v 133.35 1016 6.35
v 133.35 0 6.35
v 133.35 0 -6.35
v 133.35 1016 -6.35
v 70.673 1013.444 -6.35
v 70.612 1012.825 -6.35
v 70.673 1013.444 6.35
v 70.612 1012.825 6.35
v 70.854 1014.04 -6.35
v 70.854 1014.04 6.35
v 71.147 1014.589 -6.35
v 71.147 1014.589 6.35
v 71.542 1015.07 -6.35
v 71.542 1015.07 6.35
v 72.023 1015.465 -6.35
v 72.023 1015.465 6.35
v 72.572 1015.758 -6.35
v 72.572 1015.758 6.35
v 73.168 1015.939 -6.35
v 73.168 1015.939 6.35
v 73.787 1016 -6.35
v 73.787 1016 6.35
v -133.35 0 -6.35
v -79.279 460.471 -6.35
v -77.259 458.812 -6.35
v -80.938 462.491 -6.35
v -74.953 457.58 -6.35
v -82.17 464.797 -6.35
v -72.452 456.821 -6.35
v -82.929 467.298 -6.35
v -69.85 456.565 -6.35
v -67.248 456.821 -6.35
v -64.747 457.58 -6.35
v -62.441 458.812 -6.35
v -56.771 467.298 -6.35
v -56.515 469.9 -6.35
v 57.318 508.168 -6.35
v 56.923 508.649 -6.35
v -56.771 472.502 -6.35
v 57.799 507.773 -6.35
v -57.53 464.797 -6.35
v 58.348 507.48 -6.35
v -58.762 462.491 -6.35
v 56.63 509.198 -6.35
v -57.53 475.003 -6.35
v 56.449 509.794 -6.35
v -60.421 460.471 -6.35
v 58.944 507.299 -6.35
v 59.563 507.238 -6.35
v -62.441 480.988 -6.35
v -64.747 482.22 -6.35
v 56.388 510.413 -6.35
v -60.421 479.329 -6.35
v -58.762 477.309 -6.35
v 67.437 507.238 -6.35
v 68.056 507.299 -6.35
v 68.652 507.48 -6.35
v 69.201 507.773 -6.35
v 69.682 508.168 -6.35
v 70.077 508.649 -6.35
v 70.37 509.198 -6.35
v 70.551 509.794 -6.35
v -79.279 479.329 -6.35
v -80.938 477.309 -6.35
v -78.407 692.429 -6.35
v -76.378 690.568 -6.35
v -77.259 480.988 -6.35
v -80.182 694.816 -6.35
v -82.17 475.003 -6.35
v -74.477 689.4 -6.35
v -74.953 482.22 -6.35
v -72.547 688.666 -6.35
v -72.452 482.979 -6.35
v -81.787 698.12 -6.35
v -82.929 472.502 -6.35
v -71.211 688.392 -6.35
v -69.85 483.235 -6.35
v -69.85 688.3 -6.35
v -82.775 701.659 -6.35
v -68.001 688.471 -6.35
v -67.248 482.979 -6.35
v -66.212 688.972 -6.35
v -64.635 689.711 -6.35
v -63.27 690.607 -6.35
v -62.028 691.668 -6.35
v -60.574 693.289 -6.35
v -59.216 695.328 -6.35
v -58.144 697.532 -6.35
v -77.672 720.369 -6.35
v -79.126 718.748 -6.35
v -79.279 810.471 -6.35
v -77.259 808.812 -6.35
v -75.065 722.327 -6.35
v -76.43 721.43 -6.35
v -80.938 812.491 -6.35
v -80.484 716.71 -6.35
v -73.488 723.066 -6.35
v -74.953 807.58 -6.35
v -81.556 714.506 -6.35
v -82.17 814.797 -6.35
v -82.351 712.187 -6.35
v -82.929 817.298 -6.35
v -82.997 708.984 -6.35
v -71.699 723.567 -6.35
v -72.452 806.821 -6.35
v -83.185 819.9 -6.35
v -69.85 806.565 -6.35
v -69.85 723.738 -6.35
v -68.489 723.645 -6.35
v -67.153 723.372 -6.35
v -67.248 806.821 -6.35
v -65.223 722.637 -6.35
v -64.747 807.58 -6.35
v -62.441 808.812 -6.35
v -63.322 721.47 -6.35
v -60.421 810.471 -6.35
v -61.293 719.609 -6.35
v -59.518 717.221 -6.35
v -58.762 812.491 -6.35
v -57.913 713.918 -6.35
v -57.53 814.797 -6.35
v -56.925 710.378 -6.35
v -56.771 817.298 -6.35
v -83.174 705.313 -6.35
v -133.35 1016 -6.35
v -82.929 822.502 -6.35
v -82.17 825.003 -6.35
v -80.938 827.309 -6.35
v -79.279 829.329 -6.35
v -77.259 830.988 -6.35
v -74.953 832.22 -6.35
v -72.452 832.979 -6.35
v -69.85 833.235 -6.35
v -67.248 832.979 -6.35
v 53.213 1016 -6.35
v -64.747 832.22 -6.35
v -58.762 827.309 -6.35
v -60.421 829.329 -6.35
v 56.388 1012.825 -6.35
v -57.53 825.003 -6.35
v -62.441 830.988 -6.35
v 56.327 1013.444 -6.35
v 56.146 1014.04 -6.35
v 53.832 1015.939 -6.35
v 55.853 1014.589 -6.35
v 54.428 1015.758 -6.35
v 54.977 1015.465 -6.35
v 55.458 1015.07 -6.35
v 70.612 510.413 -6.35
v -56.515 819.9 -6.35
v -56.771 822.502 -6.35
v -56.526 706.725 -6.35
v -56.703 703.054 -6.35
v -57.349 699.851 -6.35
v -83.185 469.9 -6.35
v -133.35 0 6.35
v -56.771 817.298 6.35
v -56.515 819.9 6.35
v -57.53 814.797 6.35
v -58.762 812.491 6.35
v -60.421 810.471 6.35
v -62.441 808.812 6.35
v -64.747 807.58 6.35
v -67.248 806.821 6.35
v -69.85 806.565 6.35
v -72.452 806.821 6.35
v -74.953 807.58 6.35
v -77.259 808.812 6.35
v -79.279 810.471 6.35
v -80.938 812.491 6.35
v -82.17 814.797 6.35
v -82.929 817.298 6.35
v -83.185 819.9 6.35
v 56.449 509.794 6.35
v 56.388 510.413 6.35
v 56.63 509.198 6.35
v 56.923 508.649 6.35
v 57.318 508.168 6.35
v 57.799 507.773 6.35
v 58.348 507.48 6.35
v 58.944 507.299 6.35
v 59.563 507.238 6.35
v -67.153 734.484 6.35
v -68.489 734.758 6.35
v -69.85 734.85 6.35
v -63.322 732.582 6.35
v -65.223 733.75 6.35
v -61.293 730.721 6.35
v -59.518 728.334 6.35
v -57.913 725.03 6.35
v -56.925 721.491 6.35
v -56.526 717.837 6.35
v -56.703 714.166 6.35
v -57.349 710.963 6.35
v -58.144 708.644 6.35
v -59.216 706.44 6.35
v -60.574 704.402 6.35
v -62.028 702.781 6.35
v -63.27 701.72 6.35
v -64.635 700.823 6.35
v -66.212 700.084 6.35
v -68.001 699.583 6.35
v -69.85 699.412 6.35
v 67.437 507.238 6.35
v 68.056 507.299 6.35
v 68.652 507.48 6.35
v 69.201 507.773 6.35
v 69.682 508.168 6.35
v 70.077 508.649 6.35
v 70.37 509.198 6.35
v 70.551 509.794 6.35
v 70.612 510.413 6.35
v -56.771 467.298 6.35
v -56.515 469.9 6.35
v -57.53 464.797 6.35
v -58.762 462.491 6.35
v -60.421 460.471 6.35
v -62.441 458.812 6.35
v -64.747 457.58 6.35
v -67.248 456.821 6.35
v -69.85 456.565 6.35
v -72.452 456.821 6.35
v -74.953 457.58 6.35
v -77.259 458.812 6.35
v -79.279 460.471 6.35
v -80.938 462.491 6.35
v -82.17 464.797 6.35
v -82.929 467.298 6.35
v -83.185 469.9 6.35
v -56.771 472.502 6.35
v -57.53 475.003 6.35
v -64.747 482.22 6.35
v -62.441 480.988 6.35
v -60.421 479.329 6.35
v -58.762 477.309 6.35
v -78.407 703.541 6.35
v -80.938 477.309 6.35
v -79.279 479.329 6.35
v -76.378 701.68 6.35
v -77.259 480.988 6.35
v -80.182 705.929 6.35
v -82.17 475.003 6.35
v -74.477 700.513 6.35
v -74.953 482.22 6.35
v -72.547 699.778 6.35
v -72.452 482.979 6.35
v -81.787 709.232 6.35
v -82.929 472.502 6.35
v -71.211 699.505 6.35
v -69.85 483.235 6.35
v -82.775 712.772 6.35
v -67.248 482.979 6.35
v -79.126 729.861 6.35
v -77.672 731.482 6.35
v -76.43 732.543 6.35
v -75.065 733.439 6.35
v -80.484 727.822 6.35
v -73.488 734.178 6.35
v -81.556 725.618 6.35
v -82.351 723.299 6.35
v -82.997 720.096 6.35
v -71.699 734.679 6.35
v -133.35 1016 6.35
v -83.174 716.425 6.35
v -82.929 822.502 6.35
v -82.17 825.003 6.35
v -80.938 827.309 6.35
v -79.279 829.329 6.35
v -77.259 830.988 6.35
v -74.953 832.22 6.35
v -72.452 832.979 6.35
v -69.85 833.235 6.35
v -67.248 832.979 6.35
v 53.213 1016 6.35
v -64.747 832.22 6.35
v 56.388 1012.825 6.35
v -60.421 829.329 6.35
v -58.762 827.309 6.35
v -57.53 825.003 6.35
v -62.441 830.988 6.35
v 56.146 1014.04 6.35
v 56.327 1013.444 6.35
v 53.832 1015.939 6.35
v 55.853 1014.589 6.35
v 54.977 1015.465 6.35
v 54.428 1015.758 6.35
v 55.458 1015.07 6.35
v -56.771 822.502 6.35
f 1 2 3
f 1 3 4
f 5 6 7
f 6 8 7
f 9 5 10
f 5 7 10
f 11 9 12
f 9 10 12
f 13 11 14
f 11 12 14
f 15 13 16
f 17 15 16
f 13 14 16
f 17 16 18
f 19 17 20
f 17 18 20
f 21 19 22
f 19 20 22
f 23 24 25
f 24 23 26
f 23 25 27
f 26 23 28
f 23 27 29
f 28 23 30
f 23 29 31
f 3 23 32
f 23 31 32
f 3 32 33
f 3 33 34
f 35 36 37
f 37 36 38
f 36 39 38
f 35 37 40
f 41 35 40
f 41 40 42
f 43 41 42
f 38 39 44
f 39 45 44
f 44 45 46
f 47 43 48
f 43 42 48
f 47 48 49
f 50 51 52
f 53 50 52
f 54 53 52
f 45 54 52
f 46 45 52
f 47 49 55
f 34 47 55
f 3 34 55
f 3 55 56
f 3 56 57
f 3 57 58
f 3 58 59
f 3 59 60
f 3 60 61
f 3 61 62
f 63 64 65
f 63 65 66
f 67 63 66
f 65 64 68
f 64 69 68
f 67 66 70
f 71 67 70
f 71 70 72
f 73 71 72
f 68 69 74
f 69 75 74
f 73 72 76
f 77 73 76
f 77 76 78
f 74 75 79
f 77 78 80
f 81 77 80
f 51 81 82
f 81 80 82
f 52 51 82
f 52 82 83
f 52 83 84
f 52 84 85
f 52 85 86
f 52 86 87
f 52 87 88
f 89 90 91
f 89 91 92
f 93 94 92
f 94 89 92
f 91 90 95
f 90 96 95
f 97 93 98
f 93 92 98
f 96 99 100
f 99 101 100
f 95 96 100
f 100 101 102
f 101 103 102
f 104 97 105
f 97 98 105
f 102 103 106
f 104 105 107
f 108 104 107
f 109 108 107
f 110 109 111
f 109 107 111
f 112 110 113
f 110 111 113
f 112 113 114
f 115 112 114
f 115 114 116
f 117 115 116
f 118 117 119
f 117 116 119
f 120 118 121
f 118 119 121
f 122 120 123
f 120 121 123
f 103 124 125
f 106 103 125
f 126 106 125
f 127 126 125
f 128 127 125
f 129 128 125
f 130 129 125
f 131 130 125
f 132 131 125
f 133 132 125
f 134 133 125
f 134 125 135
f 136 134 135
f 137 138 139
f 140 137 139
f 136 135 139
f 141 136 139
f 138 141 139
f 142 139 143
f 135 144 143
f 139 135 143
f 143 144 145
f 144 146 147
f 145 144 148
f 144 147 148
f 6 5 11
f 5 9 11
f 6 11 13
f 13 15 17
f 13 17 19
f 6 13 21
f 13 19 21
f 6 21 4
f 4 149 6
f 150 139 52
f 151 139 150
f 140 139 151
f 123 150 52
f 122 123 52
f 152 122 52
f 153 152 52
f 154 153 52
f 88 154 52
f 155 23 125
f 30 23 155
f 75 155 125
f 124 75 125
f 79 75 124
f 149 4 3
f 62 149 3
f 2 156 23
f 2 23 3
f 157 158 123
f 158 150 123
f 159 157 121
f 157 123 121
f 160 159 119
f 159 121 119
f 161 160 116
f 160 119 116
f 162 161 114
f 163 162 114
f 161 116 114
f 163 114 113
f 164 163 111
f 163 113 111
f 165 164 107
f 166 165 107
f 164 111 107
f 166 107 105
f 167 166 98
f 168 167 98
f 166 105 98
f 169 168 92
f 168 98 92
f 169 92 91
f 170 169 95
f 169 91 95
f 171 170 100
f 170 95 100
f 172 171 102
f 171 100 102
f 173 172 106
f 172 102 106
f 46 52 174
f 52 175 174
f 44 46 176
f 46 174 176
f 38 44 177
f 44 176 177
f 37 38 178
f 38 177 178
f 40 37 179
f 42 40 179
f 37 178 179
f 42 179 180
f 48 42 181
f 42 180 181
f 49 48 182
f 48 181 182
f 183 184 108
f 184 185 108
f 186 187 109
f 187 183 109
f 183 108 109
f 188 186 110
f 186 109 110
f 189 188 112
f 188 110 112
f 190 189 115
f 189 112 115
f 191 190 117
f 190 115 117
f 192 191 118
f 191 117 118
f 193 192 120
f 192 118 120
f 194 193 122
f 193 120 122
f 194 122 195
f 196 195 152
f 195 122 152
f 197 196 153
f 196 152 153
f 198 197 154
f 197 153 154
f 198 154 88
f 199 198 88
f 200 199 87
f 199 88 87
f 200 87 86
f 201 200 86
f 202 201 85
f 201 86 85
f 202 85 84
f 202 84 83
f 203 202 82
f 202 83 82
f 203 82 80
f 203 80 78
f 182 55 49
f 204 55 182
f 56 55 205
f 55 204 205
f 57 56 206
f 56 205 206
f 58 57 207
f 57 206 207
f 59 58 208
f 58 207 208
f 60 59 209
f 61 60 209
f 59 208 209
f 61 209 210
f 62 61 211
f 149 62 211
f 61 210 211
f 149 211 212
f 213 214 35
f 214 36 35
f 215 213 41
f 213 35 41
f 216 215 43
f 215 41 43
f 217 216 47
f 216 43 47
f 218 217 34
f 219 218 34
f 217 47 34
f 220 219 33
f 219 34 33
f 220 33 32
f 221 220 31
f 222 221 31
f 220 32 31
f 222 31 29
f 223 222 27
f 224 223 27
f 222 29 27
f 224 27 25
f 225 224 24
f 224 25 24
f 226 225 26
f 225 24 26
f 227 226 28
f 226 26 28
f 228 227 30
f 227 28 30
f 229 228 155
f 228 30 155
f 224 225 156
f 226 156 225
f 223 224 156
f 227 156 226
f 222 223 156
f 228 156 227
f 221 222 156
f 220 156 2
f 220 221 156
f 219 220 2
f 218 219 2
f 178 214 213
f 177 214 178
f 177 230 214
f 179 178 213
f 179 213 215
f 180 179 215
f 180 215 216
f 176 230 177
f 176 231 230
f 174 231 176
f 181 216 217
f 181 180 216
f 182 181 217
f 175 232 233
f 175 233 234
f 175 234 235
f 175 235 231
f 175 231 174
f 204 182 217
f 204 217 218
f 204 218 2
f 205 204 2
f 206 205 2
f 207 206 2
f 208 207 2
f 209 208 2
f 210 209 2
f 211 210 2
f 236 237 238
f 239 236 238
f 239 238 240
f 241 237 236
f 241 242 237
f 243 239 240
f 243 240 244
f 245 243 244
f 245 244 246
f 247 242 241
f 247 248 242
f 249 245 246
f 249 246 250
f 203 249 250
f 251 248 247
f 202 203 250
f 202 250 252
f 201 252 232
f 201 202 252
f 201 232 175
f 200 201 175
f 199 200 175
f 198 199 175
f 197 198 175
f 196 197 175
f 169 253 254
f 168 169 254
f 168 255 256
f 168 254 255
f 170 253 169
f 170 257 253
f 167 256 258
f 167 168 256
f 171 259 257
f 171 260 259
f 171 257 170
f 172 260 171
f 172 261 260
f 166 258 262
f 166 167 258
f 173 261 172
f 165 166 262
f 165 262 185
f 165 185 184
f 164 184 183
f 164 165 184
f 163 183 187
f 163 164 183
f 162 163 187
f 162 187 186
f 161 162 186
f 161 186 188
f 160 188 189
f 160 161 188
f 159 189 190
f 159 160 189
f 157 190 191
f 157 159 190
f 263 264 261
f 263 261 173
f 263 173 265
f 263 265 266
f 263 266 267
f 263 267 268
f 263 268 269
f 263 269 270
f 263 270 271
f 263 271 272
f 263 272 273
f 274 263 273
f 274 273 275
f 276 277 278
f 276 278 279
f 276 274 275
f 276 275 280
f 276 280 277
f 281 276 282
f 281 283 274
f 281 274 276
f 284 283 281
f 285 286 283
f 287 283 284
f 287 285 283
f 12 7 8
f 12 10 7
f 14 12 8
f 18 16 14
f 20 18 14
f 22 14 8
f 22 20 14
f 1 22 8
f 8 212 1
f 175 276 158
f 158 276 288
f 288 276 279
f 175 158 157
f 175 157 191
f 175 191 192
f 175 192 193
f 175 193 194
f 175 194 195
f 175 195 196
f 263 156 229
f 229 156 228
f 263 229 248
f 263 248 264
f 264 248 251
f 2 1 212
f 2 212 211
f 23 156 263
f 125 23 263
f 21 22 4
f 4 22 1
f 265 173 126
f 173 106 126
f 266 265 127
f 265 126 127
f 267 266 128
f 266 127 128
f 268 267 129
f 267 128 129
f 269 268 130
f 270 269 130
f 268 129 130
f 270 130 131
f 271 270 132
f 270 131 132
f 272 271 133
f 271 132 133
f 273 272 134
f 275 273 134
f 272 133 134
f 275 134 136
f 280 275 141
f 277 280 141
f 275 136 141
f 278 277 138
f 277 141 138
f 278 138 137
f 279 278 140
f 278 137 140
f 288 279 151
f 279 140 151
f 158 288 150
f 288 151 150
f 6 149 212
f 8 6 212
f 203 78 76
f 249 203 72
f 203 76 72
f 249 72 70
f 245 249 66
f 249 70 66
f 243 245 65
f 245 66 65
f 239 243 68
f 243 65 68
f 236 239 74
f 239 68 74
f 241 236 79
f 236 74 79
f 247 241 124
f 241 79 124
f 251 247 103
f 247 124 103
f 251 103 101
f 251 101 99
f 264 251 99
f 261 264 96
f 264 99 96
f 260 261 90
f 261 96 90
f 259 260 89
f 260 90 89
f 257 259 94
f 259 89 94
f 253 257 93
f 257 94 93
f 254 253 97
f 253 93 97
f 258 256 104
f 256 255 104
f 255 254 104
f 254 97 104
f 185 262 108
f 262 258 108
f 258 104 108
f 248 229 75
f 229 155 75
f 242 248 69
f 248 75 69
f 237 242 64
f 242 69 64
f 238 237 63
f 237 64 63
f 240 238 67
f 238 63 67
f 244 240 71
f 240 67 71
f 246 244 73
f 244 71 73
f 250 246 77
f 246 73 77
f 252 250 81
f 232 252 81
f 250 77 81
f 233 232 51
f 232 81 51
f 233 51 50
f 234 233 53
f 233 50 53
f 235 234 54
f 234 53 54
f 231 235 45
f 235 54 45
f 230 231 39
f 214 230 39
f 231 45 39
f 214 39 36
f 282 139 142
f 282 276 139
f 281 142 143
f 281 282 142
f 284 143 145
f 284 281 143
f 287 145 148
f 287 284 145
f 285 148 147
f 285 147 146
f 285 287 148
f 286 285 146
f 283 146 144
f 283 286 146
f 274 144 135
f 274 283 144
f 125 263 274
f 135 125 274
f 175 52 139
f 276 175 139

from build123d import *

# Parameters (mm, degrees)
SKETCH2_W               = 266.7
SKETCH2_H               = 1016
BOSS_EXTRUDE1_DEPTH     = 6.35
CUT_EXTRUDE3_DEPTH      = 1025.733402028
CUT_EXTRUDE3_DEPTH_BACK = 1025.733402028
SKETCH5_W               = 12.7
SKETCH5_H               = 508
MOVE_FACE_SLOT_BY       = 0.762
MOVE_FACE_SLOT_2_BY     = 0.762
MOVE_FACE_SLOT_3_BY     = 0.762
FILLET1_R               = 3.175


with BuildPart() as part:
    # Sketch2 → Boss-Extrude1 (new, symmetric)
    with BuildSketch(Plane.XY):
        with Locations((0, 508)):
            Rectangle(SKETCH2_W, SKETCH2_H)
    extrude(amount=BOSS_EXTRUDE1_DEPTH, both=True)

    # Cavity1: read off the stored shape, not the designer's step
    # Cavity1: loft between two sections, ruled curve by curve
    cavity1_from = [
        Edge.make_three_point_arc((-82.55, 819.9, 6.35), (-69.85, 832.6, 6.35), (-57.15, 819.9, 6.35)),
        Edge.make_three_point_arc((-57.15, 819.9, 6.35), (-69.85, 807.2, 6.35), (-82.55, 819.9, 6.35)),
    ]
    cavity1_to = [
        Edge.make_three_point_arc((-82.55, 819.9, -6.35), (-69.85, 832.6, -6.35), (-57.15, 819.9, -6.35)),
        Edge.make_three_point_arc((-57.15, 819.9, -6.35), (-69.85, 807.2, -6.35), (-82.55, 819.9, -6.35)),
    ]
    cavity1 = Solid(Shell([*[Face.make_surface_from_curves(cavity1_from[k], cavity1_to[k]) for k in range(2)], Face(Wire(cavity1_from)), Face(Wire(cavity1_to))]))
    add(cavity1, mode=Mode.SUBTRACT)

    # Cavity1 2: loft between two sections, ruled curve by curve
    cavity1_2_from = [
        Edge.make_three_point_arc((-69.85, 714.991315977, 23.190482806), (-82.55, 724.54904, 14.827474286), (-69.85, 734.106764023, 6.464465766)),
        Edge.make_three_point_arc((-69.85, 734.106764023, 6.464465766), (-57.15, 724.54904, 14.827474286), (-69.85, 714.991315977, 23.190482806)),
    ]
    cavity1_2_to = [
        Edge.make_three_point_arc((-69.85, 689.13960738, -6.354327019), (-82.55, 698.697331403, -14.717335539), (-69.85, 708.255055426, -23.080344059)),
        Edge.make_three_point_arc((-69.85, 708.255055426, -23.080344059), (-57.15, 698.697331403, -14.717335539), (-69.85, 689.13960738, -6.354327019)),
    ]
    cavity1_2 = Solid(Shell([*[Face.make_surface_from_curves(cavity1_2_from[k], cavity1_2_to[k]) for k in range(2)], Face(Wire(cavity1_2_from)), Face(Wire(cavity1_2_to))]))
    add(cavity1_2, mode=Mode.SUBTRACT)

    # Cavity1 3: loft between two sections, ruled curve by curve
    cavity1_3_from = [
        Edge.make_three_point_arc((-82.55, 469.9, 6.35), (-69.85, 482.6, 6.35), (-57.15, 469.9, 6.35)),
        Edge.make_three_point_arc((-57.15, 469.9, 6.35), (-69.85, 457.2, 6.35), (-82.55, 469.9, 6.35)),
    ]
    cavity1_3_to = [
        Edge.make_three_point_arc((-82.55, 469.9, -6.35), (-69.85, 482.6, -6.35), (-57.15, 469.9, -6.35)),
        Edge.make_three_point_arc((-57.15, 469.9, -6.35), (-69.85, 457.2, -6.35), (-82.55, 469.9, -6.35)),
    ]
    cavity1_3 = Solid(Shell([*[Face.make_surface_from_curves(cavity1_3_from[k], cavity1_3_to[k]) for k in range(2)], Face(Wire(cavity1_3_from)), Face(Wire(cavity1_3_to))]))
    add(cavity1_3, mode=Mode.SUBTRACT)

    # Sketch5 → Cut-Extrude3 (cut, two sides: drawn at the far end of the back side and taken through both)
    with BuildSketch(Plane.XY.offset(-CUT_EXTRUDE3_DEPTH_BACK)):
        with Locations((63.5, 762)):
            Rectangle(SKETCH5_W, SKETCH5_H)
    extrude(amount=CUT_EXTRUDE3_DEPTH + CUT_EXTRUDE3_DEPTH_BACK, mode=Mode.SUBTRACT)

    # Move Face slot: a face moved inward by 0.762
    extrude(part.faces().sort_by_distance((63.5, 508, 0))[0], amount=MOVE_FACE_SLOT_BY, dir=(0, -1, 0), mode=Mode.SUBTRACT)

    # Move Face slot 2: a face moved inward by 0.762
    extrude(part.faces().sort_by_distance((69.85, 762, 0))[0], amount=MOVE_FACE_SLOT_2_BY, dir=(1, 0, 0), mode=Mode.SUBTRACT)

    # Move Face slot 3: a face moved inward by 0.762
    extrude(part.faces().sort_by_distance((57.15, 762, 0))[0], amount=MOVE_FACE_SLOT_3_BY, dir=(-1, 0, 0), mode=Mode.SUBTRACT)

    # Fillet1
    fillet1_edges = [part.edges().sort_by_distance(p)[0] for p in [
        (70.612, 1016, 0),
        (70.612, 507.238, 0),
        (56.388, 507.238, 0),
        (56.388, 1016, 0),
    ]]
    fillet(fillet1_edges, radius=FILLET1_R)

    # Move Face hole: read off the stored shape, not the designer's step
    # Move Face hole: loft between two sections, ruled curve by curve
    move_face_hole_from = [
        Edge.make_three_point_arc((-83.185, 819.9, 6.35), (-69.85, 833.235, 6.35), (-56.515, 819.9, 6.35)),
        Edge.make_three_point_arc((-56.515, 819.9, 6.35), (-69.85, 806.565, 6.35), (-83.185, 819.9, 6.35)),
    ]
    move_face_hole_to = [
        Edge.make_three_point_arc((-83.185, 819.9, -6.35), (-69.85, 833.235, -6.35), (-56.515, 819.9, -6.35)),
        Edge.make_three_point_arc((-56.515, 819.9, -6.35), (-69.85, 806.565, -6.35), (-83.185, 819.9, -6.35)),
    ]
    move_face_hole = Solid(Shell([*[Face.make_surface_from_curves(move_face_hole_from[k], move_face_hole_to[k]) for k in range(2)], Face(Wire(move_face_hole_from)), Face(Wire(move_face_hole_to))]))
    add(move_face_hole, mode=Mode.SUBTRACT)

    # Move Face hole 2: loft between two sections, ruled curve by curve
    move_face_hole_2_from = [
        Edge.make_three_point_arc((-69.85, 714.884319276, 24.032506946), (-83.185, 724.9199295, 15.251348), (-69.85, 734.955539724, 6.470189054)),
        Edge.make_three_point_arc((-69.85, 734.955539724, 6.470189054), (-56.515, 724.9199295, 15.251348), (-69.85, 714.884319276, 24.032506946)),
    ]
    move_face_hole_2_to = [
        Edge.make_three_point_arc((-69.85, 688.295650249, -6.35454337), (-83.185, 698.331260473, -15.135702316), (-69.85, 708.366870697, -23.916861262)),
        Edge.make_three_point_arc((-69.85, 708.366870697, -23.916861262), (-56.515, 698.331260473, -15.135702316), (-69.85, 688.295650249, -6.35454337)),
    ]
    move_face_hole_2 = Solid(Shell([*[Face.make_surface_from_curves(move_face_hole_2_from[k], move_face_hole_2_to[k]) for k in range(2)], Face(Wire(move_face_hole_2_from)), Face(Wire(move_face_hole_2_to))]))
    add(move_face_hole_2, mode=Mode.SUBTRACT)

    # Move Face hole 3: loft between two sections, ruled curve by curve
    move_face_hole_3_from = [
        Edge.make_three_point_arc((-83.185, 469.9, 6.35), (-69.85, 483.235, 6.35), (-56.515, 469.9, 6.35)),
        Edge.make_three_point_arc((-56.515, 469.9, 6.35), (-69.85, 456.565, 6.35), (-83.185, 469.9, 6.35)),
    ]
    move_face_hole_3_to = [
        Edge.make_three_point_arc((-83.185, 469.9, -6.35), (-69.85, 483.235, -6.35), (-56.515, 469.9, -6.35)),
        Edge.make_three_point_arc((-56.515, 469.9, -6.35), (-69.85, 456.565, -6.35), (-83.185, 469.9, -6.35)),
    ]
    move_face_hole_3 = Solid(Shell([*[Face.make_surface_from_curves(move_face_hole_3_from[k], move_face_hole_3_to[k]) for k in range(2)], Face(Wire(move_face_hole_3_from)), Face(Wire(move_face_hole_3_to))]))
    add(move_face_hole_3, mode=Mode.SUBTRACT)


solid = part.part
